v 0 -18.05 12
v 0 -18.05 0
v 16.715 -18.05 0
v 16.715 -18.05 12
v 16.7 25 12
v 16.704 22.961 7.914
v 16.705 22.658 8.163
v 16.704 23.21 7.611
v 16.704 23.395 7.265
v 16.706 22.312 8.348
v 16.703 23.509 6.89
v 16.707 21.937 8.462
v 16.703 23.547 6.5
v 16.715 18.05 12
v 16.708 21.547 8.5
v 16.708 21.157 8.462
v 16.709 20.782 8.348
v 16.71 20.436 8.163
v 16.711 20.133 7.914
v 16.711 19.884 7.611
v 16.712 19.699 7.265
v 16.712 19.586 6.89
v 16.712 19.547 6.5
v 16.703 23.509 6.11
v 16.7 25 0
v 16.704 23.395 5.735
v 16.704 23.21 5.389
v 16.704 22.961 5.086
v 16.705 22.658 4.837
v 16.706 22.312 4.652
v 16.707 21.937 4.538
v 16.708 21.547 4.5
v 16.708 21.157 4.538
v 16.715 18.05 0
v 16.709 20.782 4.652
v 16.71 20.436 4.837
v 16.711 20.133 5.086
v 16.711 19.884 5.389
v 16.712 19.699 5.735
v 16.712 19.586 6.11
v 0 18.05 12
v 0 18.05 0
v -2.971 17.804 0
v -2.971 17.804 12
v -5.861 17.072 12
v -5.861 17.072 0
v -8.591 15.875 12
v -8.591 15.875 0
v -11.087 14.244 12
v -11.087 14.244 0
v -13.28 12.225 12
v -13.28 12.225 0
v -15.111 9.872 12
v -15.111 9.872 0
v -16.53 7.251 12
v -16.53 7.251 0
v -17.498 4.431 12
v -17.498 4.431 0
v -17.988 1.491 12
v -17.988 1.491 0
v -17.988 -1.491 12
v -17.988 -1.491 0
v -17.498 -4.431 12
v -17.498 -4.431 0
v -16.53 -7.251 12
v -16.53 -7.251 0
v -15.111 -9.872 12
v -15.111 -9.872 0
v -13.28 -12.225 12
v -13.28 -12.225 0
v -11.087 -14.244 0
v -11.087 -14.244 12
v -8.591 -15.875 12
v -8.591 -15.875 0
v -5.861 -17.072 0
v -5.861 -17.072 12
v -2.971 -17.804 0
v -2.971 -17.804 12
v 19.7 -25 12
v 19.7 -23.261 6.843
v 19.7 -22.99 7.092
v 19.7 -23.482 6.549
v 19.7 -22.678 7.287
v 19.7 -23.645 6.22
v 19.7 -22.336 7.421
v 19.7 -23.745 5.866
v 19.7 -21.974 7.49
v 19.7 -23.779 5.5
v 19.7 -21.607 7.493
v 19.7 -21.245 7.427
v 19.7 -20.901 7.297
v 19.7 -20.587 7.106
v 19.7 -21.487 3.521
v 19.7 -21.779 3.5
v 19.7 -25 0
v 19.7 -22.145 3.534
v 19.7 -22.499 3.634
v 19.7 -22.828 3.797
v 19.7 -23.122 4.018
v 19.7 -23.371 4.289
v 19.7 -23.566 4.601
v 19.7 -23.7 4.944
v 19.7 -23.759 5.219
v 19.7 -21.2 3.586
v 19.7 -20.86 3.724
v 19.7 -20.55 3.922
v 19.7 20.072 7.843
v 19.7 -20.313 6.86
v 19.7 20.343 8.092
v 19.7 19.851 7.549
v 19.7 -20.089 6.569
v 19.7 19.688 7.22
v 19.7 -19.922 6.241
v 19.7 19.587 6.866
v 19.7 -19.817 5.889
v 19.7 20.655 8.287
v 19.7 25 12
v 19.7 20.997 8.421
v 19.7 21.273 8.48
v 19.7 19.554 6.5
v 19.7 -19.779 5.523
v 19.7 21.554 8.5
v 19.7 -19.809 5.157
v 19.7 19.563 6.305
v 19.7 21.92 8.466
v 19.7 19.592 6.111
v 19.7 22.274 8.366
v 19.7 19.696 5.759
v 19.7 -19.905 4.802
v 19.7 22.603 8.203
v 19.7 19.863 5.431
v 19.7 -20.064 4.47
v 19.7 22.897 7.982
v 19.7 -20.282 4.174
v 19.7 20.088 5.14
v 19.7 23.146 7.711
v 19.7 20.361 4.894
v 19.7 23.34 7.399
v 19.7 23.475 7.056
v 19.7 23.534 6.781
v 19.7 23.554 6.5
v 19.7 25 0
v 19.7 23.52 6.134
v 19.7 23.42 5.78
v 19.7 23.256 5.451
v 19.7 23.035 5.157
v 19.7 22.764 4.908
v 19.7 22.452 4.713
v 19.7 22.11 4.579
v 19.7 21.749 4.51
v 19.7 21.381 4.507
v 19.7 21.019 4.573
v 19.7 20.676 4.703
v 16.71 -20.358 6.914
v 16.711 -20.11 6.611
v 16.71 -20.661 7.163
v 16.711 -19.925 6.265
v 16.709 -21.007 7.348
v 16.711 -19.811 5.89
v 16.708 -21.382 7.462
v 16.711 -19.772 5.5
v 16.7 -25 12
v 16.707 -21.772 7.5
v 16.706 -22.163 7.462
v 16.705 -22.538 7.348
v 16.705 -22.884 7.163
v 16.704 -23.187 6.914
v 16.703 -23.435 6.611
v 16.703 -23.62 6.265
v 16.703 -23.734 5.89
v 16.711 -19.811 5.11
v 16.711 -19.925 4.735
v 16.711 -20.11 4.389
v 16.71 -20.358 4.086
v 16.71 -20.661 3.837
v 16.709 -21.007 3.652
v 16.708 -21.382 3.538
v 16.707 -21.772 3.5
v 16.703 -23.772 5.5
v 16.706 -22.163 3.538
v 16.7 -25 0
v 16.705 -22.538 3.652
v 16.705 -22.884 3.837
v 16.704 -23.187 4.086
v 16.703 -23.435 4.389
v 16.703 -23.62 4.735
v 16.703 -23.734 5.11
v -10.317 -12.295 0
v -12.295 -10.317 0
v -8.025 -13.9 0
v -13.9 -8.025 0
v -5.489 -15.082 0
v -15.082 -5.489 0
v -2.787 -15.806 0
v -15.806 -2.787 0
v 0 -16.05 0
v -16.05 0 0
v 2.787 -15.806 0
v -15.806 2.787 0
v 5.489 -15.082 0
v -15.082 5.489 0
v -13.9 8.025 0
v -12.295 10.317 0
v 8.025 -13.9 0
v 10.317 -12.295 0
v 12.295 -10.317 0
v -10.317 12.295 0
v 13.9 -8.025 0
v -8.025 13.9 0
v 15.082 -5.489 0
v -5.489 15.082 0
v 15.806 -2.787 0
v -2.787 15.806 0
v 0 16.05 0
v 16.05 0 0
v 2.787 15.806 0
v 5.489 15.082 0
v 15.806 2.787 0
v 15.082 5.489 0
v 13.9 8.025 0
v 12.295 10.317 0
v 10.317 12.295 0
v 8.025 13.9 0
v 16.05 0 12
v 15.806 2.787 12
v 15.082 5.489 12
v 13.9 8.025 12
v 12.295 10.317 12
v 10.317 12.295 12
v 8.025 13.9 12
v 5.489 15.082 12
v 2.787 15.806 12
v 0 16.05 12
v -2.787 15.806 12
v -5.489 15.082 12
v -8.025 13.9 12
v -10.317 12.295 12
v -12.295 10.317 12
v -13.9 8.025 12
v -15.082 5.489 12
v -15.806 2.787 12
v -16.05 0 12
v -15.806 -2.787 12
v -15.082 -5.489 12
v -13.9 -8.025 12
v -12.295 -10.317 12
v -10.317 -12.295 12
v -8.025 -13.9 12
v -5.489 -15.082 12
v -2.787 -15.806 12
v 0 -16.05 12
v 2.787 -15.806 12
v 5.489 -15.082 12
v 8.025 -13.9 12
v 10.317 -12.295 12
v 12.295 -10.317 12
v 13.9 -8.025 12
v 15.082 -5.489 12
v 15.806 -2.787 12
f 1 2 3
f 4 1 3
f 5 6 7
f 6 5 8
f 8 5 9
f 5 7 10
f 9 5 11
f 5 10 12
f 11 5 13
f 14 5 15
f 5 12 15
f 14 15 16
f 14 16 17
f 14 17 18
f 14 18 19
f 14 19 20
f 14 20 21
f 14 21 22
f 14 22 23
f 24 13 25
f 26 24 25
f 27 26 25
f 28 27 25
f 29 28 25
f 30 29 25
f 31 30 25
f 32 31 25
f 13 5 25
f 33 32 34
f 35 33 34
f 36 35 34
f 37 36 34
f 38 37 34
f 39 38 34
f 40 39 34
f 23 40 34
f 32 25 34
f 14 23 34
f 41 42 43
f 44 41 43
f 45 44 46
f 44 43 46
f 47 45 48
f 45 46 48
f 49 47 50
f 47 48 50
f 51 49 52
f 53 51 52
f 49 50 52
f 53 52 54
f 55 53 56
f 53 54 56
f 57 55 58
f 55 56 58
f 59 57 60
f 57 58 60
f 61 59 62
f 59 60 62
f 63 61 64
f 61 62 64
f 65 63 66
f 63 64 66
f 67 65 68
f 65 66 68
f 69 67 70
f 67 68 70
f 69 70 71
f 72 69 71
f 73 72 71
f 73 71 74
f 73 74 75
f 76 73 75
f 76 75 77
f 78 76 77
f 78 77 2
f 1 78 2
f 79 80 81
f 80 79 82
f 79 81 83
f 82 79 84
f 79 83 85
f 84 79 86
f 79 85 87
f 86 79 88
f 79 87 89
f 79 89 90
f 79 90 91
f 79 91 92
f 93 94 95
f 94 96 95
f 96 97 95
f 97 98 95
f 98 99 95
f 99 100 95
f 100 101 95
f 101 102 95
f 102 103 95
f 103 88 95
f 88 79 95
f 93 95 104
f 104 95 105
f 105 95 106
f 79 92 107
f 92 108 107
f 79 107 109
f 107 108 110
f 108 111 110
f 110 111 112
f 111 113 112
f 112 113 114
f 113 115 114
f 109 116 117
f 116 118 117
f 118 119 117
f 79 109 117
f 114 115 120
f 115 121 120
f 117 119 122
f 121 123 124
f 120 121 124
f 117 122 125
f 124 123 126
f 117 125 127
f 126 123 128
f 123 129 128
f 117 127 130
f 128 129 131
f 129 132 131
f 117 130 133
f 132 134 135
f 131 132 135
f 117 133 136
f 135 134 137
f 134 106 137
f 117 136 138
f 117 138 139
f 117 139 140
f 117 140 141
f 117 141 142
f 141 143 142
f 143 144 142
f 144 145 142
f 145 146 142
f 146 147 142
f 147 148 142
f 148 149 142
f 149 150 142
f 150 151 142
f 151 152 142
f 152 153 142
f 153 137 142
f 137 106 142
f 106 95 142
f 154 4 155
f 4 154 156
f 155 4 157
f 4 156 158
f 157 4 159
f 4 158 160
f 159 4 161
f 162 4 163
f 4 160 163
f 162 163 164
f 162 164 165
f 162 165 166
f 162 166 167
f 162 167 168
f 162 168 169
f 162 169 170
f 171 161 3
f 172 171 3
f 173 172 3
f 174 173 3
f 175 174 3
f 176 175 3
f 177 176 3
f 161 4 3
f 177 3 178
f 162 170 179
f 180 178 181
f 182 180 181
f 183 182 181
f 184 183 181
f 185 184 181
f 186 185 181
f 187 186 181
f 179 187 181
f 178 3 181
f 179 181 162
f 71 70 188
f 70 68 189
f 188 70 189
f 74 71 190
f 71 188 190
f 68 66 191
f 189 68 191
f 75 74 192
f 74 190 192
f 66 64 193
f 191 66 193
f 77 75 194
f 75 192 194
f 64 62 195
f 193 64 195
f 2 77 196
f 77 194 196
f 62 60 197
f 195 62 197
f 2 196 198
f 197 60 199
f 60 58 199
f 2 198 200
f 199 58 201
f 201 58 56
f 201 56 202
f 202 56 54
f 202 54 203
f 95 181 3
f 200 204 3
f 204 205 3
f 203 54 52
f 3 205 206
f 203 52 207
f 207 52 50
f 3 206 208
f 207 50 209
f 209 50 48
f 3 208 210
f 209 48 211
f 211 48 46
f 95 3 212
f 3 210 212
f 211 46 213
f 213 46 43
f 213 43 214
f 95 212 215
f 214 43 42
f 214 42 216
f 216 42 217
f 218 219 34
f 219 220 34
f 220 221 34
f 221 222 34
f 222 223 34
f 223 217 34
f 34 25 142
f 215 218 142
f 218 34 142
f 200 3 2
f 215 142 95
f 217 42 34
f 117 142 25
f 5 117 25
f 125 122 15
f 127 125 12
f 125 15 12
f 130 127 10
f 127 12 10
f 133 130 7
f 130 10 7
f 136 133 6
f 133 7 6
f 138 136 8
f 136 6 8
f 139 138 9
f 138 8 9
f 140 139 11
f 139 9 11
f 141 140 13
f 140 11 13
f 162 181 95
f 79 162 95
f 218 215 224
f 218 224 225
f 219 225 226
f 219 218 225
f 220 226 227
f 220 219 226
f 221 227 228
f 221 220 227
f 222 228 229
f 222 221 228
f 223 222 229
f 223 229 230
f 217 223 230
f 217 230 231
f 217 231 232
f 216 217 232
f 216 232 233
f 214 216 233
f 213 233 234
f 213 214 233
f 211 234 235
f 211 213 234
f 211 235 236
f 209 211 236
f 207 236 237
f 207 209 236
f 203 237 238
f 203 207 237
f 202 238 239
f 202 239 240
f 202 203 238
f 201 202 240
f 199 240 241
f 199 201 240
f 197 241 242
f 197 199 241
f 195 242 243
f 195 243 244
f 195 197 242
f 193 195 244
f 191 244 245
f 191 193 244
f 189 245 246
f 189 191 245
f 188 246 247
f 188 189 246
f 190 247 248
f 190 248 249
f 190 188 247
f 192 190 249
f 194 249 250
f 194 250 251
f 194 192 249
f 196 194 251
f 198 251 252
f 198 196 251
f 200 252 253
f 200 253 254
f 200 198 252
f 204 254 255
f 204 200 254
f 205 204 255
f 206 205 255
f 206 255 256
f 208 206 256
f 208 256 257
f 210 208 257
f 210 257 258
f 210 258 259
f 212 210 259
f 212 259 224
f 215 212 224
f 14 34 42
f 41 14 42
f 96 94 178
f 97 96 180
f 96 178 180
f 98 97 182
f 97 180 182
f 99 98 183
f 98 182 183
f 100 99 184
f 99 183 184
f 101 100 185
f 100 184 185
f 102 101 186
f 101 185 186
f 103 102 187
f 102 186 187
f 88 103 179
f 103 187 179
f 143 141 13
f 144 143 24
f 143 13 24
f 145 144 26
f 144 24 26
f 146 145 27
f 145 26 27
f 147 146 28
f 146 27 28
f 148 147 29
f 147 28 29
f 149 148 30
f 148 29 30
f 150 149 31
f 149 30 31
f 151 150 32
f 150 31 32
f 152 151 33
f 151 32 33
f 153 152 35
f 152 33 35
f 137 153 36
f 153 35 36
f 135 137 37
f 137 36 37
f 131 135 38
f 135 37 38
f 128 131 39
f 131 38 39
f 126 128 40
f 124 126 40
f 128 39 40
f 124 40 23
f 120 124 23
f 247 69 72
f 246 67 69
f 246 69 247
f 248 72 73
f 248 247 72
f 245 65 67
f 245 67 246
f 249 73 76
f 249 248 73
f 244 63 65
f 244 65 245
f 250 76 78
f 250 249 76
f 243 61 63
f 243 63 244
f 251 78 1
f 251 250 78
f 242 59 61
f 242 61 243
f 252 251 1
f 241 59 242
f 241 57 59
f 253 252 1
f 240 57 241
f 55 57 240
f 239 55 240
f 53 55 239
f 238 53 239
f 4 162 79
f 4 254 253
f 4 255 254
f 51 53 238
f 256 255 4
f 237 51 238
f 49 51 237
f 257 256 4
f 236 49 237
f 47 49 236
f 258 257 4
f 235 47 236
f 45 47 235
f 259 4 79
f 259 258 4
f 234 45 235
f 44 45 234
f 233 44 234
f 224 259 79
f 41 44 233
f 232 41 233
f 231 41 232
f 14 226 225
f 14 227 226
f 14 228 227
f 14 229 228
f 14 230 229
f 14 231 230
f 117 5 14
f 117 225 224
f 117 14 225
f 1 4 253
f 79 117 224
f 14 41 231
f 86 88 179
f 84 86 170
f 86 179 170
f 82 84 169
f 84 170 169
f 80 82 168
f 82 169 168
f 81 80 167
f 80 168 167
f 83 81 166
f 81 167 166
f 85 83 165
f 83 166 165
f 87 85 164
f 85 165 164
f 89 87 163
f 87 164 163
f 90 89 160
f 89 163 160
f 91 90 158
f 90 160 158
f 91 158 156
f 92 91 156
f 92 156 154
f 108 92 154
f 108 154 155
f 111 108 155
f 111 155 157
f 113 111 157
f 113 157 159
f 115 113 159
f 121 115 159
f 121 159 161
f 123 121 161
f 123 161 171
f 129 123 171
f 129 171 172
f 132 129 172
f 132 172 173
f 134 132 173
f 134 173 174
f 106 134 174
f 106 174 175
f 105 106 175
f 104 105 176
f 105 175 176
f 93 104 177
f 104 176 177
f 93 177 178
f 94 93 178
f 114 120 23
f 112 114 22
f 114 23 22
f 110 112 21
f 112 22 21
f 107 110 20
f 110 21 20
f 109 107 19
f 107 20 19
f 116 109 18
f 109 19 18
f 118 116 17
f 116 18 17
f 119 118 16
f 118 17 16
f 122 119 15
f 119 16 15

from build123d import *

# Parameters (mm, degrees)
F0_R     = 16.05
F1_DEPTH = 12
F3_DEPTH = 25
F5_DEPTH = 25


# Not quite as in the source:
# - a feature names something its author has since deleted; it is built from what else it names


with BuildPart() as f1:
    # F0 (on Top) → F1 (new body)
    with BuildSketch(Plane.XY):
        with BuildLine():
            ThreePointArc((0, -18.05), (12.7632774004, -12.7632774004), (18.05, 0))
            ThreePointArc((18.05, 0), (12.7632774004, 12.7632774004), (0, 18.05))
            ThreePointArc((0, 18.05), (-18.05, 0), (0, -18.05))
        make_face()
        Circle(F0_R, mode=Mode.SUBTRACT)
        with BuildLine():
            ThreePointArc((0, 18.05), (12.7632774004, 12.7632774004), (18.05, 0))
            ThreePointArc((18.05, 0), (12.7632774004, -12.7632774004), (0, -18.05))
            Line((0, -18.05), (16.7152378708, -18.05))
            Line((16.7152378708, -18.05), (16.7, -25))
            Line((16.7, -25), (19.7, -25))
            Line((19.7, -25), (19.7, 0))
            Line((19.7, 0), (19.7, 25))
            Line((19.7, 25), (16.7, 25))
            Line((16.7, 25), (16.7152378708, 18.05))
            Line((16.7152378708, 18.05), (0, 18.05))
        make_face()
    extrude(amount=F1_DEPTH)

    # F2 (on face) → F3 (cut)
    with BuildSketch(Plane(origin=(16.754731944, -0.0367347397, 0), x_dir=(-0.0021924941, -0.9999975965, 0), z_dir=(-0.9999975965, 0.0021924941, 0))):
        with BuildLine():
            ThreePointArc((23.7358004302, 5.5), (20.3215868678, 6.9142135624), (21.7358004302, 3.5))
            Line((21.7358004302, 3.5), (21.7358004302, 5.5))
            Line((21.7358004302, 5.5), (23.7358004302, 5.5))
        make_face()
        with BuildLine():
            Line((21.7358004302, 5.5), (21.7358004302, 3.5))
            ThreePointArc((21.7358004302, 3.5), (23.1500139926, 4.0857864376), (23.7358004302, 5.5))
            Line((23.7358004302, 5.5), (21.7358004302, 5.5))
        make_face()
    extrude(amount=-F3_DEPTH, mode=Mode.SUBTRACT)

    # F4 (on face) → F5 (cut)
    with BuildSketch(Plane(origin=(16.754731944, 0.0367347397, 0), x_dir=(0.0021924941, -0.9999975965, 0), z_dir=(-0.9999975965, -0.0021924941, 0))):
        with BuildLine():
            Line((-21.5104483068, 6.5), (-21.5104483068, 8.5))
            ThreePointArc((-21.5104483068, 8.5), (-22.9246618692, 7.9142135624), (-23.5104483068, 6.5))
            Line((-23.5104483068, 6.5), (-21.5104483068, 6.5))
        make_face()
        with BuildLine():
            ThreePointArc((-19.5104483068, 6.5), (-20.0962347444, 7.9142135624), (-21.5104483068, 8.5))
            Line((-21.5104483068, 8.5), (-21.5104483068, 6.5))
            Line((-21.5104483068, 6.5), (-23.5104483068, 6.5))
            ThreePointArc((-23.5104483068, 6.5), (-21.5104483068, 4.5), (-19.5104483068, 6.5))
        make_face()
    extrude(amount=-F5_DEPTH, mode=Mode.SUBTRACT)


solid = f1.part
